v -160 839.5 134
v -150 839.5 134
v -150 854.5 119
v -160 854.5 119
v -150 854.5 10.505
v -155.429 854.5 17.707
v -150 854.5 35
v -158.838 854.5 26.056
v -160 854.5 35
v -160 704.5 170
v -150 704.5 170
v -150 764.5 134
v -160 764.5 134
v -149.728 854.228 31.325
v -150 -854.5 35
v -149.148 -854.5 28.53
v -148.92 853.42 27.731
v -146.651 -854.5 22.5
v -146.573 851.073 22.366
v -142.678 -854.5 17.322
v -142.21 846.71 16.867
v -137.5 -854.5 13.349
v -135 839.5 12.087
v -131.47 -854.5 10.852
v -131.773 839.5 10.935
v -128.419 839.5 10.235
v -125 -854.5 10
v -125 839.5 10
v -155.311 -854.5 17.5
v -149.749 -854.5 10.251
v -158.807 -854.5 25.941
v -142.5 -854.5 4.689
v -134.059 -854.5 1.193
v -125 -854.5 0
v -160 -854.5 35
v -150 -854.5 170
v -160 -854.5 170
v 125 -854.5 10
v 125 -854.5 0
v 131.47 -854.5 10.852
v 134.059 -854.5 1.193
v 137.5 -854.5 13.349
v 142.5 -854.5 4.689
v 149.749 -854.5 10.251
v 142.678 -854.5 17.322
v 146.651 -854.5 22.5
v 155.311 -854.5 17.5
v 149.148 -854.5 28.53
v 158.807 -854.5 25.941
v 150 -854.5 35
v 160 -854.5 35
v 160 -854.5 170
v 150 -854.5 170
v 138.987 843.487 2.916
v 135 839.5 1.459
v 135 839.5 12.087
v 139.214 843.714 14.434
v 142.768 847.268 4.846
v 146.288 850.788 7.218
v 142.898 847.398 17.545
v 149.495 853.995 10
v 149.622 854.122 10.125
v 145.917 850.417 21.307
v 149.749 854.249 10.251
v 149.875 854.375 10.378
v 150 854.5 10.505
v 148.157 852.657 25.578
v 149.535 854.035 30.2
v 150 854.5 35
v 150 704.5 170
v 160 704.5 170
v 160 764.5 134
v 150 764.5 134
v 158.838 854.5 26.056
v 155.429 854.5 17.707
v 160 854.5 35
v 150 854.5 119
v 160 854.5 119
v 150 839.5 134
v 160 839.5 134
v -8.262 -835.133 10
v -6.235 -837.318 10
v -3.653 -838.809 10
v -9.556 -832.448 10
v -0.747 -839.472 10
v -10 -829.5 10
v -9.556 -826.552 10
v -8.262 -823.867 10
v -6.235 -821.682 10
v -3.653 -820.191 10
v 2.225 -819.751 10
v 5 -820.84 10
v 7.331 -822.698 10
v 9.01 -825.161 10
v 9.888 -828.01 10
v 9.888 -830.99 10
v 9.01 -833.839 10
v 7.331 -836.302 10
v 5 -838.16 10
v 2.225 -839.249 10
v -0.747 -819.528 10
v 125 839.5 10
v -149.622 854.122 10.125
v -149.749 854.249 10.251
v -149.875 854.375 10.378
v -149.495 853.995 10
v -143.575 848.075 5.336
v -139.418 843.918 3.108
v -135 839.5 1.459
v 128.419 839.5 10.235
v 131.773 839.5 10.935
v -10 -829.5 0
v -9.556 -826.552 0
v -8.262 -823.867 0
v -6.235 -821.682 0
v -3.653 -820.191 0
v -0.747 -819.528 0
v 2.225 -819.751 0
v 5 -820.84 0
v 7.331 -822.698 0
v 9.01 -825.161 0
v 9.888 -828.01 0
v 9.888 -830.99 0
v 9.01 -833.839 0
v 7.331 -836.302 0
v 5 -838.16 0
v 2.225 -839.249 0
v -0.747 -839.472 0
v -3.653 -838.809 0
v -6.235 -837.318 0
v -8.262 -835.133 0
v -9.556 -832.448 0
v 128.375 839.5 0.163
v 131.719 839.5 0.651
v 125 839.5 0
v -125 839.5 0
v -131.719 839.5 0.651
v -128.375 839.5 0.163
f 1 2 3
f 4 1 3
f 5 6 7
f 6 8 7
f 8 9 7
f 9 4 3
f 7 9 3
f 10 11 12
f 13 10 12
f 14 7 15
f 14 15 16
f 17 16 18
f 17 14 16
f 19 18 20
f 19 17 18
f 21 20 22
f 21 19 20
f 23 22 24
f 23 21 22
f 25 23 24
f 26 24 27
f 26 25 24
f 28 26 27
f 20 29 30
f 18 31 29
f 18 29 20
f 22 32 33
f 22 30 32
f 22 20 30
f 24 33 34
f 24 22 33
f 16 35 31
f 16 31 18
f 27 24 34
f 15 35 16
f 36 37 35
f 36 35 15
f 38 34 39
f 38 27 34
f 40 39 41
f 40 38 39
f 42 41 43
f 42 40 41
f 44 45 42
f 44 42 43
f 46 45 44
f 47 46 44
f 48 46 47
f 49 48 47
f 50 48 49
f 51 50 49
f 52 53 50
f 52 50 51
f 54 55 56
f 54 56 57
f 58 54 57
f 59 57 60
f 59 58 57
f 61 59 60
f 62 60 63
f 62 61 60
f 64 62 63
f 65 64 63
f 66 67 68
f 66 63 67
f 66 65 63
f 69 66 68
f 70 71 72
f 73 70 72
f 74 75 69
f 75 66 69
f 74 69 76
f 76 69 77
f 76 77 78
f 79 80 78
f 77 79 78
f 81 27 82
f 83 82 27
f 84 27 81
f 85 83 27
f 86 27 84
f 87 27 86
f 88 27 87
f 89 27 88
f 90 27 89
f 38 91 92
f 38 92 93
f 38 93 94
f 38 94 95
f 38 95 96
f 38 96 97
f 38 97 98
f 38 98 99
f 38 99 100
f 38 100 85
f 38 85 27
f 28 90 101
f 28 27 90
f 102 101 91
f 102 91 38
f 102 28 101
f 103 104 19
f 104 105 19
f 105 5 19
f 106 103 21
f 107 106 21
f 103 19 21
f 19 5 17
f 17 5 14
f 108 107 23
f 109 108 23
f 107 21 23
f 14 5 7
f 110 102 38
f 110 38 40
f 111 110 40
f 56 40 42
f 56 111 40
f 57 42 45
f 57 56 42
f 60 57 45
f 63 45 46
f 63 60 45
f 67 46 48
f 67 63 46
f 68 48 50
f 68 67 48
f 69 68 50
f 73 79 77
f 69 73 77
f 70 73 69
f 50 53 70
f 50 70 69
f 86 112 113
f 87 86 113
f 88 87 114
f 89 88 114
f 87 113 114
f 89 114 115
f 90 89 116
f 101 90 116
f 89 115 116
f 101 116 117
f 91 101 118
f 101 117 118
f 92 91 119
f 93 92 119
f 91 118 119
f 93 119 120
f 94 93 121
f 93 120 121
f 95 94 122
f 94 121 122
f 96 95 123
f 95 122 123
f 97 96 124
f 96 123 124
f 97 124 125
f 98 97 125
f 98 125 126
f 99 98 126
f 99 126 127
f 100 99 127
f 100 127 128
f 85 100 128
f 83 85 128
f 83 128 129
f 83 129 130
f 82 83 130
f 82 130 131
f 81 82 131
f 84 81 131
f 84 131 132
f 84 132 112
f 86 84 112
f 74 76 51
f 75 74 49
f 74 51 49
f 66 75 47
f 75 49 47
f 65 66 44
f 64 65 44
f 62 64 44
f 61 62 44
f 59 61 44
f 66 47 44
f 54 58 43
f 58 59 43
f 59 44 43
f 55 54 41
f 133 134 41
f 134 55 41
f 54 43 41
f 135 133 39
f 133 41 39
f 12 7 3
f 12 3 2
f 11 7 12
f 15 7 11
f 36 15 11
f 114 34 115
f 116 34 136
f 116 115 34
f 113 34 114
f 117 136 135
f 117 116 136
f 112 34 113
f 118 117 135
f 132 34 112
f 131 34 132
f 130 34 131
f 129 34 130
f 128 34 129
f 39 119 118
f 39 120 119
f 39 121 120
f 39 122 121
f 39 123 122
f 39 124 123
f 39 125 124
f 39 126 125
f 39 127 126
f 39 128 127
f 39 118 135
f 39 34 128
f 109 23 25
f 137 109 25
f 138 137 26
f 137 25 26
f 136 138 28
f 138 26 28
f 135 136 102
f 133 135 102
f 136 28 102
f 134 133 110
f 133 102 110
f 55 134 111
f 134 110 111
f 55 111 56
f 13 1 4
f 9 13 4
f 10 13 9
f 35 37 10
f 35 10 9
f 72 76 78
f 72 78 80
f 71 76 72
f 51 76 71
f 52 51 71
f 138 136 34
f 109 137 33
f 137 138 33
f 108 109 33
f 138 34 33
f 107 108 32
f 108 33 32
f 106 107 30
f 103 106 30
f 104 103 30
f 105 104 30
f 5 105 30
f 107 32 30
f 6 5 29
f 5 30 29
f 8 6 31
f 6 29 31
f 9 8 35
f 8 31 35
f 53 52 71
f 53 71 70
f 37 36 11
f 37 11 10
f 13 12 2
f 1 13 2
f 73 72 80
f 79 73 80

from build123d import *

# Parameters (mm, degrees)
F1_DEPTH      = 854.5
F2_R          = 25
F3_R          = 35
F5_DEPTH      = 320.001
F7_D          = 20
F9_DEPTH      = 30
F9_DEPTH_BACK = 10


with BuildPart() as f1:
    # F0 (on Front) → F1 (new body, symmetric)
    with BuildSketch(Plane.XZ):
        Polygon((-150, 170), (-160, 170), (-160, 0), (160, 0), (160, 170), (150, 170), (150, 10), (-150, 10), align=None)
    extrude(amount=F1_DEPTH, both=True)

    # F2
    f2_edges = [f1.edges().sort_by_distance(p)[0] for p in [
        (-150, 0, 10),
        (150, 0, 10),
    ]]
    fillet(f2_edges, radius=F2_R)

    # F3
    f3_edges = [f1.edges().sort_by_distance(p)[0] for p in [
        (160, 0, 0),
        (-160, 0, 0),
    ]]
    fillet(f3_edges, radius=F3_R)

    # F4 (on face) → F5 (cut, through all)
    with BuildSketch(Plane.YZ.offset(160)):
        Polygon((854.5, 170), (704.5, 170), (764.5, 134), (839.5, 134), (854.5, 119), align=None)
    extrude(amount=-F5_DEPTH, mode=Mode.SUBTRACT)

    # F7 (through all)
    with Locations(Plane.XY.offset(10)):
        with Locations((0, -829.5)):
            Hole(F7_D / 2)

    # F8 (on face) → F9 (cut, two sides)
    with BuildSketch(Plane.XY.offset(10)) as f9_sk:
        Polygon((-150, 854.5), (-135, 839.5), (135, 839.5), (150, 854.5), align=None)
    extrude(amount=F9_DEPTH, mode=Mode.SUBTRACT)
    extrude(f9_sk.sketch, amount=-F9_DEPTH_BACK, mode=Mode.SUBTRACT)


solid = f1.part
